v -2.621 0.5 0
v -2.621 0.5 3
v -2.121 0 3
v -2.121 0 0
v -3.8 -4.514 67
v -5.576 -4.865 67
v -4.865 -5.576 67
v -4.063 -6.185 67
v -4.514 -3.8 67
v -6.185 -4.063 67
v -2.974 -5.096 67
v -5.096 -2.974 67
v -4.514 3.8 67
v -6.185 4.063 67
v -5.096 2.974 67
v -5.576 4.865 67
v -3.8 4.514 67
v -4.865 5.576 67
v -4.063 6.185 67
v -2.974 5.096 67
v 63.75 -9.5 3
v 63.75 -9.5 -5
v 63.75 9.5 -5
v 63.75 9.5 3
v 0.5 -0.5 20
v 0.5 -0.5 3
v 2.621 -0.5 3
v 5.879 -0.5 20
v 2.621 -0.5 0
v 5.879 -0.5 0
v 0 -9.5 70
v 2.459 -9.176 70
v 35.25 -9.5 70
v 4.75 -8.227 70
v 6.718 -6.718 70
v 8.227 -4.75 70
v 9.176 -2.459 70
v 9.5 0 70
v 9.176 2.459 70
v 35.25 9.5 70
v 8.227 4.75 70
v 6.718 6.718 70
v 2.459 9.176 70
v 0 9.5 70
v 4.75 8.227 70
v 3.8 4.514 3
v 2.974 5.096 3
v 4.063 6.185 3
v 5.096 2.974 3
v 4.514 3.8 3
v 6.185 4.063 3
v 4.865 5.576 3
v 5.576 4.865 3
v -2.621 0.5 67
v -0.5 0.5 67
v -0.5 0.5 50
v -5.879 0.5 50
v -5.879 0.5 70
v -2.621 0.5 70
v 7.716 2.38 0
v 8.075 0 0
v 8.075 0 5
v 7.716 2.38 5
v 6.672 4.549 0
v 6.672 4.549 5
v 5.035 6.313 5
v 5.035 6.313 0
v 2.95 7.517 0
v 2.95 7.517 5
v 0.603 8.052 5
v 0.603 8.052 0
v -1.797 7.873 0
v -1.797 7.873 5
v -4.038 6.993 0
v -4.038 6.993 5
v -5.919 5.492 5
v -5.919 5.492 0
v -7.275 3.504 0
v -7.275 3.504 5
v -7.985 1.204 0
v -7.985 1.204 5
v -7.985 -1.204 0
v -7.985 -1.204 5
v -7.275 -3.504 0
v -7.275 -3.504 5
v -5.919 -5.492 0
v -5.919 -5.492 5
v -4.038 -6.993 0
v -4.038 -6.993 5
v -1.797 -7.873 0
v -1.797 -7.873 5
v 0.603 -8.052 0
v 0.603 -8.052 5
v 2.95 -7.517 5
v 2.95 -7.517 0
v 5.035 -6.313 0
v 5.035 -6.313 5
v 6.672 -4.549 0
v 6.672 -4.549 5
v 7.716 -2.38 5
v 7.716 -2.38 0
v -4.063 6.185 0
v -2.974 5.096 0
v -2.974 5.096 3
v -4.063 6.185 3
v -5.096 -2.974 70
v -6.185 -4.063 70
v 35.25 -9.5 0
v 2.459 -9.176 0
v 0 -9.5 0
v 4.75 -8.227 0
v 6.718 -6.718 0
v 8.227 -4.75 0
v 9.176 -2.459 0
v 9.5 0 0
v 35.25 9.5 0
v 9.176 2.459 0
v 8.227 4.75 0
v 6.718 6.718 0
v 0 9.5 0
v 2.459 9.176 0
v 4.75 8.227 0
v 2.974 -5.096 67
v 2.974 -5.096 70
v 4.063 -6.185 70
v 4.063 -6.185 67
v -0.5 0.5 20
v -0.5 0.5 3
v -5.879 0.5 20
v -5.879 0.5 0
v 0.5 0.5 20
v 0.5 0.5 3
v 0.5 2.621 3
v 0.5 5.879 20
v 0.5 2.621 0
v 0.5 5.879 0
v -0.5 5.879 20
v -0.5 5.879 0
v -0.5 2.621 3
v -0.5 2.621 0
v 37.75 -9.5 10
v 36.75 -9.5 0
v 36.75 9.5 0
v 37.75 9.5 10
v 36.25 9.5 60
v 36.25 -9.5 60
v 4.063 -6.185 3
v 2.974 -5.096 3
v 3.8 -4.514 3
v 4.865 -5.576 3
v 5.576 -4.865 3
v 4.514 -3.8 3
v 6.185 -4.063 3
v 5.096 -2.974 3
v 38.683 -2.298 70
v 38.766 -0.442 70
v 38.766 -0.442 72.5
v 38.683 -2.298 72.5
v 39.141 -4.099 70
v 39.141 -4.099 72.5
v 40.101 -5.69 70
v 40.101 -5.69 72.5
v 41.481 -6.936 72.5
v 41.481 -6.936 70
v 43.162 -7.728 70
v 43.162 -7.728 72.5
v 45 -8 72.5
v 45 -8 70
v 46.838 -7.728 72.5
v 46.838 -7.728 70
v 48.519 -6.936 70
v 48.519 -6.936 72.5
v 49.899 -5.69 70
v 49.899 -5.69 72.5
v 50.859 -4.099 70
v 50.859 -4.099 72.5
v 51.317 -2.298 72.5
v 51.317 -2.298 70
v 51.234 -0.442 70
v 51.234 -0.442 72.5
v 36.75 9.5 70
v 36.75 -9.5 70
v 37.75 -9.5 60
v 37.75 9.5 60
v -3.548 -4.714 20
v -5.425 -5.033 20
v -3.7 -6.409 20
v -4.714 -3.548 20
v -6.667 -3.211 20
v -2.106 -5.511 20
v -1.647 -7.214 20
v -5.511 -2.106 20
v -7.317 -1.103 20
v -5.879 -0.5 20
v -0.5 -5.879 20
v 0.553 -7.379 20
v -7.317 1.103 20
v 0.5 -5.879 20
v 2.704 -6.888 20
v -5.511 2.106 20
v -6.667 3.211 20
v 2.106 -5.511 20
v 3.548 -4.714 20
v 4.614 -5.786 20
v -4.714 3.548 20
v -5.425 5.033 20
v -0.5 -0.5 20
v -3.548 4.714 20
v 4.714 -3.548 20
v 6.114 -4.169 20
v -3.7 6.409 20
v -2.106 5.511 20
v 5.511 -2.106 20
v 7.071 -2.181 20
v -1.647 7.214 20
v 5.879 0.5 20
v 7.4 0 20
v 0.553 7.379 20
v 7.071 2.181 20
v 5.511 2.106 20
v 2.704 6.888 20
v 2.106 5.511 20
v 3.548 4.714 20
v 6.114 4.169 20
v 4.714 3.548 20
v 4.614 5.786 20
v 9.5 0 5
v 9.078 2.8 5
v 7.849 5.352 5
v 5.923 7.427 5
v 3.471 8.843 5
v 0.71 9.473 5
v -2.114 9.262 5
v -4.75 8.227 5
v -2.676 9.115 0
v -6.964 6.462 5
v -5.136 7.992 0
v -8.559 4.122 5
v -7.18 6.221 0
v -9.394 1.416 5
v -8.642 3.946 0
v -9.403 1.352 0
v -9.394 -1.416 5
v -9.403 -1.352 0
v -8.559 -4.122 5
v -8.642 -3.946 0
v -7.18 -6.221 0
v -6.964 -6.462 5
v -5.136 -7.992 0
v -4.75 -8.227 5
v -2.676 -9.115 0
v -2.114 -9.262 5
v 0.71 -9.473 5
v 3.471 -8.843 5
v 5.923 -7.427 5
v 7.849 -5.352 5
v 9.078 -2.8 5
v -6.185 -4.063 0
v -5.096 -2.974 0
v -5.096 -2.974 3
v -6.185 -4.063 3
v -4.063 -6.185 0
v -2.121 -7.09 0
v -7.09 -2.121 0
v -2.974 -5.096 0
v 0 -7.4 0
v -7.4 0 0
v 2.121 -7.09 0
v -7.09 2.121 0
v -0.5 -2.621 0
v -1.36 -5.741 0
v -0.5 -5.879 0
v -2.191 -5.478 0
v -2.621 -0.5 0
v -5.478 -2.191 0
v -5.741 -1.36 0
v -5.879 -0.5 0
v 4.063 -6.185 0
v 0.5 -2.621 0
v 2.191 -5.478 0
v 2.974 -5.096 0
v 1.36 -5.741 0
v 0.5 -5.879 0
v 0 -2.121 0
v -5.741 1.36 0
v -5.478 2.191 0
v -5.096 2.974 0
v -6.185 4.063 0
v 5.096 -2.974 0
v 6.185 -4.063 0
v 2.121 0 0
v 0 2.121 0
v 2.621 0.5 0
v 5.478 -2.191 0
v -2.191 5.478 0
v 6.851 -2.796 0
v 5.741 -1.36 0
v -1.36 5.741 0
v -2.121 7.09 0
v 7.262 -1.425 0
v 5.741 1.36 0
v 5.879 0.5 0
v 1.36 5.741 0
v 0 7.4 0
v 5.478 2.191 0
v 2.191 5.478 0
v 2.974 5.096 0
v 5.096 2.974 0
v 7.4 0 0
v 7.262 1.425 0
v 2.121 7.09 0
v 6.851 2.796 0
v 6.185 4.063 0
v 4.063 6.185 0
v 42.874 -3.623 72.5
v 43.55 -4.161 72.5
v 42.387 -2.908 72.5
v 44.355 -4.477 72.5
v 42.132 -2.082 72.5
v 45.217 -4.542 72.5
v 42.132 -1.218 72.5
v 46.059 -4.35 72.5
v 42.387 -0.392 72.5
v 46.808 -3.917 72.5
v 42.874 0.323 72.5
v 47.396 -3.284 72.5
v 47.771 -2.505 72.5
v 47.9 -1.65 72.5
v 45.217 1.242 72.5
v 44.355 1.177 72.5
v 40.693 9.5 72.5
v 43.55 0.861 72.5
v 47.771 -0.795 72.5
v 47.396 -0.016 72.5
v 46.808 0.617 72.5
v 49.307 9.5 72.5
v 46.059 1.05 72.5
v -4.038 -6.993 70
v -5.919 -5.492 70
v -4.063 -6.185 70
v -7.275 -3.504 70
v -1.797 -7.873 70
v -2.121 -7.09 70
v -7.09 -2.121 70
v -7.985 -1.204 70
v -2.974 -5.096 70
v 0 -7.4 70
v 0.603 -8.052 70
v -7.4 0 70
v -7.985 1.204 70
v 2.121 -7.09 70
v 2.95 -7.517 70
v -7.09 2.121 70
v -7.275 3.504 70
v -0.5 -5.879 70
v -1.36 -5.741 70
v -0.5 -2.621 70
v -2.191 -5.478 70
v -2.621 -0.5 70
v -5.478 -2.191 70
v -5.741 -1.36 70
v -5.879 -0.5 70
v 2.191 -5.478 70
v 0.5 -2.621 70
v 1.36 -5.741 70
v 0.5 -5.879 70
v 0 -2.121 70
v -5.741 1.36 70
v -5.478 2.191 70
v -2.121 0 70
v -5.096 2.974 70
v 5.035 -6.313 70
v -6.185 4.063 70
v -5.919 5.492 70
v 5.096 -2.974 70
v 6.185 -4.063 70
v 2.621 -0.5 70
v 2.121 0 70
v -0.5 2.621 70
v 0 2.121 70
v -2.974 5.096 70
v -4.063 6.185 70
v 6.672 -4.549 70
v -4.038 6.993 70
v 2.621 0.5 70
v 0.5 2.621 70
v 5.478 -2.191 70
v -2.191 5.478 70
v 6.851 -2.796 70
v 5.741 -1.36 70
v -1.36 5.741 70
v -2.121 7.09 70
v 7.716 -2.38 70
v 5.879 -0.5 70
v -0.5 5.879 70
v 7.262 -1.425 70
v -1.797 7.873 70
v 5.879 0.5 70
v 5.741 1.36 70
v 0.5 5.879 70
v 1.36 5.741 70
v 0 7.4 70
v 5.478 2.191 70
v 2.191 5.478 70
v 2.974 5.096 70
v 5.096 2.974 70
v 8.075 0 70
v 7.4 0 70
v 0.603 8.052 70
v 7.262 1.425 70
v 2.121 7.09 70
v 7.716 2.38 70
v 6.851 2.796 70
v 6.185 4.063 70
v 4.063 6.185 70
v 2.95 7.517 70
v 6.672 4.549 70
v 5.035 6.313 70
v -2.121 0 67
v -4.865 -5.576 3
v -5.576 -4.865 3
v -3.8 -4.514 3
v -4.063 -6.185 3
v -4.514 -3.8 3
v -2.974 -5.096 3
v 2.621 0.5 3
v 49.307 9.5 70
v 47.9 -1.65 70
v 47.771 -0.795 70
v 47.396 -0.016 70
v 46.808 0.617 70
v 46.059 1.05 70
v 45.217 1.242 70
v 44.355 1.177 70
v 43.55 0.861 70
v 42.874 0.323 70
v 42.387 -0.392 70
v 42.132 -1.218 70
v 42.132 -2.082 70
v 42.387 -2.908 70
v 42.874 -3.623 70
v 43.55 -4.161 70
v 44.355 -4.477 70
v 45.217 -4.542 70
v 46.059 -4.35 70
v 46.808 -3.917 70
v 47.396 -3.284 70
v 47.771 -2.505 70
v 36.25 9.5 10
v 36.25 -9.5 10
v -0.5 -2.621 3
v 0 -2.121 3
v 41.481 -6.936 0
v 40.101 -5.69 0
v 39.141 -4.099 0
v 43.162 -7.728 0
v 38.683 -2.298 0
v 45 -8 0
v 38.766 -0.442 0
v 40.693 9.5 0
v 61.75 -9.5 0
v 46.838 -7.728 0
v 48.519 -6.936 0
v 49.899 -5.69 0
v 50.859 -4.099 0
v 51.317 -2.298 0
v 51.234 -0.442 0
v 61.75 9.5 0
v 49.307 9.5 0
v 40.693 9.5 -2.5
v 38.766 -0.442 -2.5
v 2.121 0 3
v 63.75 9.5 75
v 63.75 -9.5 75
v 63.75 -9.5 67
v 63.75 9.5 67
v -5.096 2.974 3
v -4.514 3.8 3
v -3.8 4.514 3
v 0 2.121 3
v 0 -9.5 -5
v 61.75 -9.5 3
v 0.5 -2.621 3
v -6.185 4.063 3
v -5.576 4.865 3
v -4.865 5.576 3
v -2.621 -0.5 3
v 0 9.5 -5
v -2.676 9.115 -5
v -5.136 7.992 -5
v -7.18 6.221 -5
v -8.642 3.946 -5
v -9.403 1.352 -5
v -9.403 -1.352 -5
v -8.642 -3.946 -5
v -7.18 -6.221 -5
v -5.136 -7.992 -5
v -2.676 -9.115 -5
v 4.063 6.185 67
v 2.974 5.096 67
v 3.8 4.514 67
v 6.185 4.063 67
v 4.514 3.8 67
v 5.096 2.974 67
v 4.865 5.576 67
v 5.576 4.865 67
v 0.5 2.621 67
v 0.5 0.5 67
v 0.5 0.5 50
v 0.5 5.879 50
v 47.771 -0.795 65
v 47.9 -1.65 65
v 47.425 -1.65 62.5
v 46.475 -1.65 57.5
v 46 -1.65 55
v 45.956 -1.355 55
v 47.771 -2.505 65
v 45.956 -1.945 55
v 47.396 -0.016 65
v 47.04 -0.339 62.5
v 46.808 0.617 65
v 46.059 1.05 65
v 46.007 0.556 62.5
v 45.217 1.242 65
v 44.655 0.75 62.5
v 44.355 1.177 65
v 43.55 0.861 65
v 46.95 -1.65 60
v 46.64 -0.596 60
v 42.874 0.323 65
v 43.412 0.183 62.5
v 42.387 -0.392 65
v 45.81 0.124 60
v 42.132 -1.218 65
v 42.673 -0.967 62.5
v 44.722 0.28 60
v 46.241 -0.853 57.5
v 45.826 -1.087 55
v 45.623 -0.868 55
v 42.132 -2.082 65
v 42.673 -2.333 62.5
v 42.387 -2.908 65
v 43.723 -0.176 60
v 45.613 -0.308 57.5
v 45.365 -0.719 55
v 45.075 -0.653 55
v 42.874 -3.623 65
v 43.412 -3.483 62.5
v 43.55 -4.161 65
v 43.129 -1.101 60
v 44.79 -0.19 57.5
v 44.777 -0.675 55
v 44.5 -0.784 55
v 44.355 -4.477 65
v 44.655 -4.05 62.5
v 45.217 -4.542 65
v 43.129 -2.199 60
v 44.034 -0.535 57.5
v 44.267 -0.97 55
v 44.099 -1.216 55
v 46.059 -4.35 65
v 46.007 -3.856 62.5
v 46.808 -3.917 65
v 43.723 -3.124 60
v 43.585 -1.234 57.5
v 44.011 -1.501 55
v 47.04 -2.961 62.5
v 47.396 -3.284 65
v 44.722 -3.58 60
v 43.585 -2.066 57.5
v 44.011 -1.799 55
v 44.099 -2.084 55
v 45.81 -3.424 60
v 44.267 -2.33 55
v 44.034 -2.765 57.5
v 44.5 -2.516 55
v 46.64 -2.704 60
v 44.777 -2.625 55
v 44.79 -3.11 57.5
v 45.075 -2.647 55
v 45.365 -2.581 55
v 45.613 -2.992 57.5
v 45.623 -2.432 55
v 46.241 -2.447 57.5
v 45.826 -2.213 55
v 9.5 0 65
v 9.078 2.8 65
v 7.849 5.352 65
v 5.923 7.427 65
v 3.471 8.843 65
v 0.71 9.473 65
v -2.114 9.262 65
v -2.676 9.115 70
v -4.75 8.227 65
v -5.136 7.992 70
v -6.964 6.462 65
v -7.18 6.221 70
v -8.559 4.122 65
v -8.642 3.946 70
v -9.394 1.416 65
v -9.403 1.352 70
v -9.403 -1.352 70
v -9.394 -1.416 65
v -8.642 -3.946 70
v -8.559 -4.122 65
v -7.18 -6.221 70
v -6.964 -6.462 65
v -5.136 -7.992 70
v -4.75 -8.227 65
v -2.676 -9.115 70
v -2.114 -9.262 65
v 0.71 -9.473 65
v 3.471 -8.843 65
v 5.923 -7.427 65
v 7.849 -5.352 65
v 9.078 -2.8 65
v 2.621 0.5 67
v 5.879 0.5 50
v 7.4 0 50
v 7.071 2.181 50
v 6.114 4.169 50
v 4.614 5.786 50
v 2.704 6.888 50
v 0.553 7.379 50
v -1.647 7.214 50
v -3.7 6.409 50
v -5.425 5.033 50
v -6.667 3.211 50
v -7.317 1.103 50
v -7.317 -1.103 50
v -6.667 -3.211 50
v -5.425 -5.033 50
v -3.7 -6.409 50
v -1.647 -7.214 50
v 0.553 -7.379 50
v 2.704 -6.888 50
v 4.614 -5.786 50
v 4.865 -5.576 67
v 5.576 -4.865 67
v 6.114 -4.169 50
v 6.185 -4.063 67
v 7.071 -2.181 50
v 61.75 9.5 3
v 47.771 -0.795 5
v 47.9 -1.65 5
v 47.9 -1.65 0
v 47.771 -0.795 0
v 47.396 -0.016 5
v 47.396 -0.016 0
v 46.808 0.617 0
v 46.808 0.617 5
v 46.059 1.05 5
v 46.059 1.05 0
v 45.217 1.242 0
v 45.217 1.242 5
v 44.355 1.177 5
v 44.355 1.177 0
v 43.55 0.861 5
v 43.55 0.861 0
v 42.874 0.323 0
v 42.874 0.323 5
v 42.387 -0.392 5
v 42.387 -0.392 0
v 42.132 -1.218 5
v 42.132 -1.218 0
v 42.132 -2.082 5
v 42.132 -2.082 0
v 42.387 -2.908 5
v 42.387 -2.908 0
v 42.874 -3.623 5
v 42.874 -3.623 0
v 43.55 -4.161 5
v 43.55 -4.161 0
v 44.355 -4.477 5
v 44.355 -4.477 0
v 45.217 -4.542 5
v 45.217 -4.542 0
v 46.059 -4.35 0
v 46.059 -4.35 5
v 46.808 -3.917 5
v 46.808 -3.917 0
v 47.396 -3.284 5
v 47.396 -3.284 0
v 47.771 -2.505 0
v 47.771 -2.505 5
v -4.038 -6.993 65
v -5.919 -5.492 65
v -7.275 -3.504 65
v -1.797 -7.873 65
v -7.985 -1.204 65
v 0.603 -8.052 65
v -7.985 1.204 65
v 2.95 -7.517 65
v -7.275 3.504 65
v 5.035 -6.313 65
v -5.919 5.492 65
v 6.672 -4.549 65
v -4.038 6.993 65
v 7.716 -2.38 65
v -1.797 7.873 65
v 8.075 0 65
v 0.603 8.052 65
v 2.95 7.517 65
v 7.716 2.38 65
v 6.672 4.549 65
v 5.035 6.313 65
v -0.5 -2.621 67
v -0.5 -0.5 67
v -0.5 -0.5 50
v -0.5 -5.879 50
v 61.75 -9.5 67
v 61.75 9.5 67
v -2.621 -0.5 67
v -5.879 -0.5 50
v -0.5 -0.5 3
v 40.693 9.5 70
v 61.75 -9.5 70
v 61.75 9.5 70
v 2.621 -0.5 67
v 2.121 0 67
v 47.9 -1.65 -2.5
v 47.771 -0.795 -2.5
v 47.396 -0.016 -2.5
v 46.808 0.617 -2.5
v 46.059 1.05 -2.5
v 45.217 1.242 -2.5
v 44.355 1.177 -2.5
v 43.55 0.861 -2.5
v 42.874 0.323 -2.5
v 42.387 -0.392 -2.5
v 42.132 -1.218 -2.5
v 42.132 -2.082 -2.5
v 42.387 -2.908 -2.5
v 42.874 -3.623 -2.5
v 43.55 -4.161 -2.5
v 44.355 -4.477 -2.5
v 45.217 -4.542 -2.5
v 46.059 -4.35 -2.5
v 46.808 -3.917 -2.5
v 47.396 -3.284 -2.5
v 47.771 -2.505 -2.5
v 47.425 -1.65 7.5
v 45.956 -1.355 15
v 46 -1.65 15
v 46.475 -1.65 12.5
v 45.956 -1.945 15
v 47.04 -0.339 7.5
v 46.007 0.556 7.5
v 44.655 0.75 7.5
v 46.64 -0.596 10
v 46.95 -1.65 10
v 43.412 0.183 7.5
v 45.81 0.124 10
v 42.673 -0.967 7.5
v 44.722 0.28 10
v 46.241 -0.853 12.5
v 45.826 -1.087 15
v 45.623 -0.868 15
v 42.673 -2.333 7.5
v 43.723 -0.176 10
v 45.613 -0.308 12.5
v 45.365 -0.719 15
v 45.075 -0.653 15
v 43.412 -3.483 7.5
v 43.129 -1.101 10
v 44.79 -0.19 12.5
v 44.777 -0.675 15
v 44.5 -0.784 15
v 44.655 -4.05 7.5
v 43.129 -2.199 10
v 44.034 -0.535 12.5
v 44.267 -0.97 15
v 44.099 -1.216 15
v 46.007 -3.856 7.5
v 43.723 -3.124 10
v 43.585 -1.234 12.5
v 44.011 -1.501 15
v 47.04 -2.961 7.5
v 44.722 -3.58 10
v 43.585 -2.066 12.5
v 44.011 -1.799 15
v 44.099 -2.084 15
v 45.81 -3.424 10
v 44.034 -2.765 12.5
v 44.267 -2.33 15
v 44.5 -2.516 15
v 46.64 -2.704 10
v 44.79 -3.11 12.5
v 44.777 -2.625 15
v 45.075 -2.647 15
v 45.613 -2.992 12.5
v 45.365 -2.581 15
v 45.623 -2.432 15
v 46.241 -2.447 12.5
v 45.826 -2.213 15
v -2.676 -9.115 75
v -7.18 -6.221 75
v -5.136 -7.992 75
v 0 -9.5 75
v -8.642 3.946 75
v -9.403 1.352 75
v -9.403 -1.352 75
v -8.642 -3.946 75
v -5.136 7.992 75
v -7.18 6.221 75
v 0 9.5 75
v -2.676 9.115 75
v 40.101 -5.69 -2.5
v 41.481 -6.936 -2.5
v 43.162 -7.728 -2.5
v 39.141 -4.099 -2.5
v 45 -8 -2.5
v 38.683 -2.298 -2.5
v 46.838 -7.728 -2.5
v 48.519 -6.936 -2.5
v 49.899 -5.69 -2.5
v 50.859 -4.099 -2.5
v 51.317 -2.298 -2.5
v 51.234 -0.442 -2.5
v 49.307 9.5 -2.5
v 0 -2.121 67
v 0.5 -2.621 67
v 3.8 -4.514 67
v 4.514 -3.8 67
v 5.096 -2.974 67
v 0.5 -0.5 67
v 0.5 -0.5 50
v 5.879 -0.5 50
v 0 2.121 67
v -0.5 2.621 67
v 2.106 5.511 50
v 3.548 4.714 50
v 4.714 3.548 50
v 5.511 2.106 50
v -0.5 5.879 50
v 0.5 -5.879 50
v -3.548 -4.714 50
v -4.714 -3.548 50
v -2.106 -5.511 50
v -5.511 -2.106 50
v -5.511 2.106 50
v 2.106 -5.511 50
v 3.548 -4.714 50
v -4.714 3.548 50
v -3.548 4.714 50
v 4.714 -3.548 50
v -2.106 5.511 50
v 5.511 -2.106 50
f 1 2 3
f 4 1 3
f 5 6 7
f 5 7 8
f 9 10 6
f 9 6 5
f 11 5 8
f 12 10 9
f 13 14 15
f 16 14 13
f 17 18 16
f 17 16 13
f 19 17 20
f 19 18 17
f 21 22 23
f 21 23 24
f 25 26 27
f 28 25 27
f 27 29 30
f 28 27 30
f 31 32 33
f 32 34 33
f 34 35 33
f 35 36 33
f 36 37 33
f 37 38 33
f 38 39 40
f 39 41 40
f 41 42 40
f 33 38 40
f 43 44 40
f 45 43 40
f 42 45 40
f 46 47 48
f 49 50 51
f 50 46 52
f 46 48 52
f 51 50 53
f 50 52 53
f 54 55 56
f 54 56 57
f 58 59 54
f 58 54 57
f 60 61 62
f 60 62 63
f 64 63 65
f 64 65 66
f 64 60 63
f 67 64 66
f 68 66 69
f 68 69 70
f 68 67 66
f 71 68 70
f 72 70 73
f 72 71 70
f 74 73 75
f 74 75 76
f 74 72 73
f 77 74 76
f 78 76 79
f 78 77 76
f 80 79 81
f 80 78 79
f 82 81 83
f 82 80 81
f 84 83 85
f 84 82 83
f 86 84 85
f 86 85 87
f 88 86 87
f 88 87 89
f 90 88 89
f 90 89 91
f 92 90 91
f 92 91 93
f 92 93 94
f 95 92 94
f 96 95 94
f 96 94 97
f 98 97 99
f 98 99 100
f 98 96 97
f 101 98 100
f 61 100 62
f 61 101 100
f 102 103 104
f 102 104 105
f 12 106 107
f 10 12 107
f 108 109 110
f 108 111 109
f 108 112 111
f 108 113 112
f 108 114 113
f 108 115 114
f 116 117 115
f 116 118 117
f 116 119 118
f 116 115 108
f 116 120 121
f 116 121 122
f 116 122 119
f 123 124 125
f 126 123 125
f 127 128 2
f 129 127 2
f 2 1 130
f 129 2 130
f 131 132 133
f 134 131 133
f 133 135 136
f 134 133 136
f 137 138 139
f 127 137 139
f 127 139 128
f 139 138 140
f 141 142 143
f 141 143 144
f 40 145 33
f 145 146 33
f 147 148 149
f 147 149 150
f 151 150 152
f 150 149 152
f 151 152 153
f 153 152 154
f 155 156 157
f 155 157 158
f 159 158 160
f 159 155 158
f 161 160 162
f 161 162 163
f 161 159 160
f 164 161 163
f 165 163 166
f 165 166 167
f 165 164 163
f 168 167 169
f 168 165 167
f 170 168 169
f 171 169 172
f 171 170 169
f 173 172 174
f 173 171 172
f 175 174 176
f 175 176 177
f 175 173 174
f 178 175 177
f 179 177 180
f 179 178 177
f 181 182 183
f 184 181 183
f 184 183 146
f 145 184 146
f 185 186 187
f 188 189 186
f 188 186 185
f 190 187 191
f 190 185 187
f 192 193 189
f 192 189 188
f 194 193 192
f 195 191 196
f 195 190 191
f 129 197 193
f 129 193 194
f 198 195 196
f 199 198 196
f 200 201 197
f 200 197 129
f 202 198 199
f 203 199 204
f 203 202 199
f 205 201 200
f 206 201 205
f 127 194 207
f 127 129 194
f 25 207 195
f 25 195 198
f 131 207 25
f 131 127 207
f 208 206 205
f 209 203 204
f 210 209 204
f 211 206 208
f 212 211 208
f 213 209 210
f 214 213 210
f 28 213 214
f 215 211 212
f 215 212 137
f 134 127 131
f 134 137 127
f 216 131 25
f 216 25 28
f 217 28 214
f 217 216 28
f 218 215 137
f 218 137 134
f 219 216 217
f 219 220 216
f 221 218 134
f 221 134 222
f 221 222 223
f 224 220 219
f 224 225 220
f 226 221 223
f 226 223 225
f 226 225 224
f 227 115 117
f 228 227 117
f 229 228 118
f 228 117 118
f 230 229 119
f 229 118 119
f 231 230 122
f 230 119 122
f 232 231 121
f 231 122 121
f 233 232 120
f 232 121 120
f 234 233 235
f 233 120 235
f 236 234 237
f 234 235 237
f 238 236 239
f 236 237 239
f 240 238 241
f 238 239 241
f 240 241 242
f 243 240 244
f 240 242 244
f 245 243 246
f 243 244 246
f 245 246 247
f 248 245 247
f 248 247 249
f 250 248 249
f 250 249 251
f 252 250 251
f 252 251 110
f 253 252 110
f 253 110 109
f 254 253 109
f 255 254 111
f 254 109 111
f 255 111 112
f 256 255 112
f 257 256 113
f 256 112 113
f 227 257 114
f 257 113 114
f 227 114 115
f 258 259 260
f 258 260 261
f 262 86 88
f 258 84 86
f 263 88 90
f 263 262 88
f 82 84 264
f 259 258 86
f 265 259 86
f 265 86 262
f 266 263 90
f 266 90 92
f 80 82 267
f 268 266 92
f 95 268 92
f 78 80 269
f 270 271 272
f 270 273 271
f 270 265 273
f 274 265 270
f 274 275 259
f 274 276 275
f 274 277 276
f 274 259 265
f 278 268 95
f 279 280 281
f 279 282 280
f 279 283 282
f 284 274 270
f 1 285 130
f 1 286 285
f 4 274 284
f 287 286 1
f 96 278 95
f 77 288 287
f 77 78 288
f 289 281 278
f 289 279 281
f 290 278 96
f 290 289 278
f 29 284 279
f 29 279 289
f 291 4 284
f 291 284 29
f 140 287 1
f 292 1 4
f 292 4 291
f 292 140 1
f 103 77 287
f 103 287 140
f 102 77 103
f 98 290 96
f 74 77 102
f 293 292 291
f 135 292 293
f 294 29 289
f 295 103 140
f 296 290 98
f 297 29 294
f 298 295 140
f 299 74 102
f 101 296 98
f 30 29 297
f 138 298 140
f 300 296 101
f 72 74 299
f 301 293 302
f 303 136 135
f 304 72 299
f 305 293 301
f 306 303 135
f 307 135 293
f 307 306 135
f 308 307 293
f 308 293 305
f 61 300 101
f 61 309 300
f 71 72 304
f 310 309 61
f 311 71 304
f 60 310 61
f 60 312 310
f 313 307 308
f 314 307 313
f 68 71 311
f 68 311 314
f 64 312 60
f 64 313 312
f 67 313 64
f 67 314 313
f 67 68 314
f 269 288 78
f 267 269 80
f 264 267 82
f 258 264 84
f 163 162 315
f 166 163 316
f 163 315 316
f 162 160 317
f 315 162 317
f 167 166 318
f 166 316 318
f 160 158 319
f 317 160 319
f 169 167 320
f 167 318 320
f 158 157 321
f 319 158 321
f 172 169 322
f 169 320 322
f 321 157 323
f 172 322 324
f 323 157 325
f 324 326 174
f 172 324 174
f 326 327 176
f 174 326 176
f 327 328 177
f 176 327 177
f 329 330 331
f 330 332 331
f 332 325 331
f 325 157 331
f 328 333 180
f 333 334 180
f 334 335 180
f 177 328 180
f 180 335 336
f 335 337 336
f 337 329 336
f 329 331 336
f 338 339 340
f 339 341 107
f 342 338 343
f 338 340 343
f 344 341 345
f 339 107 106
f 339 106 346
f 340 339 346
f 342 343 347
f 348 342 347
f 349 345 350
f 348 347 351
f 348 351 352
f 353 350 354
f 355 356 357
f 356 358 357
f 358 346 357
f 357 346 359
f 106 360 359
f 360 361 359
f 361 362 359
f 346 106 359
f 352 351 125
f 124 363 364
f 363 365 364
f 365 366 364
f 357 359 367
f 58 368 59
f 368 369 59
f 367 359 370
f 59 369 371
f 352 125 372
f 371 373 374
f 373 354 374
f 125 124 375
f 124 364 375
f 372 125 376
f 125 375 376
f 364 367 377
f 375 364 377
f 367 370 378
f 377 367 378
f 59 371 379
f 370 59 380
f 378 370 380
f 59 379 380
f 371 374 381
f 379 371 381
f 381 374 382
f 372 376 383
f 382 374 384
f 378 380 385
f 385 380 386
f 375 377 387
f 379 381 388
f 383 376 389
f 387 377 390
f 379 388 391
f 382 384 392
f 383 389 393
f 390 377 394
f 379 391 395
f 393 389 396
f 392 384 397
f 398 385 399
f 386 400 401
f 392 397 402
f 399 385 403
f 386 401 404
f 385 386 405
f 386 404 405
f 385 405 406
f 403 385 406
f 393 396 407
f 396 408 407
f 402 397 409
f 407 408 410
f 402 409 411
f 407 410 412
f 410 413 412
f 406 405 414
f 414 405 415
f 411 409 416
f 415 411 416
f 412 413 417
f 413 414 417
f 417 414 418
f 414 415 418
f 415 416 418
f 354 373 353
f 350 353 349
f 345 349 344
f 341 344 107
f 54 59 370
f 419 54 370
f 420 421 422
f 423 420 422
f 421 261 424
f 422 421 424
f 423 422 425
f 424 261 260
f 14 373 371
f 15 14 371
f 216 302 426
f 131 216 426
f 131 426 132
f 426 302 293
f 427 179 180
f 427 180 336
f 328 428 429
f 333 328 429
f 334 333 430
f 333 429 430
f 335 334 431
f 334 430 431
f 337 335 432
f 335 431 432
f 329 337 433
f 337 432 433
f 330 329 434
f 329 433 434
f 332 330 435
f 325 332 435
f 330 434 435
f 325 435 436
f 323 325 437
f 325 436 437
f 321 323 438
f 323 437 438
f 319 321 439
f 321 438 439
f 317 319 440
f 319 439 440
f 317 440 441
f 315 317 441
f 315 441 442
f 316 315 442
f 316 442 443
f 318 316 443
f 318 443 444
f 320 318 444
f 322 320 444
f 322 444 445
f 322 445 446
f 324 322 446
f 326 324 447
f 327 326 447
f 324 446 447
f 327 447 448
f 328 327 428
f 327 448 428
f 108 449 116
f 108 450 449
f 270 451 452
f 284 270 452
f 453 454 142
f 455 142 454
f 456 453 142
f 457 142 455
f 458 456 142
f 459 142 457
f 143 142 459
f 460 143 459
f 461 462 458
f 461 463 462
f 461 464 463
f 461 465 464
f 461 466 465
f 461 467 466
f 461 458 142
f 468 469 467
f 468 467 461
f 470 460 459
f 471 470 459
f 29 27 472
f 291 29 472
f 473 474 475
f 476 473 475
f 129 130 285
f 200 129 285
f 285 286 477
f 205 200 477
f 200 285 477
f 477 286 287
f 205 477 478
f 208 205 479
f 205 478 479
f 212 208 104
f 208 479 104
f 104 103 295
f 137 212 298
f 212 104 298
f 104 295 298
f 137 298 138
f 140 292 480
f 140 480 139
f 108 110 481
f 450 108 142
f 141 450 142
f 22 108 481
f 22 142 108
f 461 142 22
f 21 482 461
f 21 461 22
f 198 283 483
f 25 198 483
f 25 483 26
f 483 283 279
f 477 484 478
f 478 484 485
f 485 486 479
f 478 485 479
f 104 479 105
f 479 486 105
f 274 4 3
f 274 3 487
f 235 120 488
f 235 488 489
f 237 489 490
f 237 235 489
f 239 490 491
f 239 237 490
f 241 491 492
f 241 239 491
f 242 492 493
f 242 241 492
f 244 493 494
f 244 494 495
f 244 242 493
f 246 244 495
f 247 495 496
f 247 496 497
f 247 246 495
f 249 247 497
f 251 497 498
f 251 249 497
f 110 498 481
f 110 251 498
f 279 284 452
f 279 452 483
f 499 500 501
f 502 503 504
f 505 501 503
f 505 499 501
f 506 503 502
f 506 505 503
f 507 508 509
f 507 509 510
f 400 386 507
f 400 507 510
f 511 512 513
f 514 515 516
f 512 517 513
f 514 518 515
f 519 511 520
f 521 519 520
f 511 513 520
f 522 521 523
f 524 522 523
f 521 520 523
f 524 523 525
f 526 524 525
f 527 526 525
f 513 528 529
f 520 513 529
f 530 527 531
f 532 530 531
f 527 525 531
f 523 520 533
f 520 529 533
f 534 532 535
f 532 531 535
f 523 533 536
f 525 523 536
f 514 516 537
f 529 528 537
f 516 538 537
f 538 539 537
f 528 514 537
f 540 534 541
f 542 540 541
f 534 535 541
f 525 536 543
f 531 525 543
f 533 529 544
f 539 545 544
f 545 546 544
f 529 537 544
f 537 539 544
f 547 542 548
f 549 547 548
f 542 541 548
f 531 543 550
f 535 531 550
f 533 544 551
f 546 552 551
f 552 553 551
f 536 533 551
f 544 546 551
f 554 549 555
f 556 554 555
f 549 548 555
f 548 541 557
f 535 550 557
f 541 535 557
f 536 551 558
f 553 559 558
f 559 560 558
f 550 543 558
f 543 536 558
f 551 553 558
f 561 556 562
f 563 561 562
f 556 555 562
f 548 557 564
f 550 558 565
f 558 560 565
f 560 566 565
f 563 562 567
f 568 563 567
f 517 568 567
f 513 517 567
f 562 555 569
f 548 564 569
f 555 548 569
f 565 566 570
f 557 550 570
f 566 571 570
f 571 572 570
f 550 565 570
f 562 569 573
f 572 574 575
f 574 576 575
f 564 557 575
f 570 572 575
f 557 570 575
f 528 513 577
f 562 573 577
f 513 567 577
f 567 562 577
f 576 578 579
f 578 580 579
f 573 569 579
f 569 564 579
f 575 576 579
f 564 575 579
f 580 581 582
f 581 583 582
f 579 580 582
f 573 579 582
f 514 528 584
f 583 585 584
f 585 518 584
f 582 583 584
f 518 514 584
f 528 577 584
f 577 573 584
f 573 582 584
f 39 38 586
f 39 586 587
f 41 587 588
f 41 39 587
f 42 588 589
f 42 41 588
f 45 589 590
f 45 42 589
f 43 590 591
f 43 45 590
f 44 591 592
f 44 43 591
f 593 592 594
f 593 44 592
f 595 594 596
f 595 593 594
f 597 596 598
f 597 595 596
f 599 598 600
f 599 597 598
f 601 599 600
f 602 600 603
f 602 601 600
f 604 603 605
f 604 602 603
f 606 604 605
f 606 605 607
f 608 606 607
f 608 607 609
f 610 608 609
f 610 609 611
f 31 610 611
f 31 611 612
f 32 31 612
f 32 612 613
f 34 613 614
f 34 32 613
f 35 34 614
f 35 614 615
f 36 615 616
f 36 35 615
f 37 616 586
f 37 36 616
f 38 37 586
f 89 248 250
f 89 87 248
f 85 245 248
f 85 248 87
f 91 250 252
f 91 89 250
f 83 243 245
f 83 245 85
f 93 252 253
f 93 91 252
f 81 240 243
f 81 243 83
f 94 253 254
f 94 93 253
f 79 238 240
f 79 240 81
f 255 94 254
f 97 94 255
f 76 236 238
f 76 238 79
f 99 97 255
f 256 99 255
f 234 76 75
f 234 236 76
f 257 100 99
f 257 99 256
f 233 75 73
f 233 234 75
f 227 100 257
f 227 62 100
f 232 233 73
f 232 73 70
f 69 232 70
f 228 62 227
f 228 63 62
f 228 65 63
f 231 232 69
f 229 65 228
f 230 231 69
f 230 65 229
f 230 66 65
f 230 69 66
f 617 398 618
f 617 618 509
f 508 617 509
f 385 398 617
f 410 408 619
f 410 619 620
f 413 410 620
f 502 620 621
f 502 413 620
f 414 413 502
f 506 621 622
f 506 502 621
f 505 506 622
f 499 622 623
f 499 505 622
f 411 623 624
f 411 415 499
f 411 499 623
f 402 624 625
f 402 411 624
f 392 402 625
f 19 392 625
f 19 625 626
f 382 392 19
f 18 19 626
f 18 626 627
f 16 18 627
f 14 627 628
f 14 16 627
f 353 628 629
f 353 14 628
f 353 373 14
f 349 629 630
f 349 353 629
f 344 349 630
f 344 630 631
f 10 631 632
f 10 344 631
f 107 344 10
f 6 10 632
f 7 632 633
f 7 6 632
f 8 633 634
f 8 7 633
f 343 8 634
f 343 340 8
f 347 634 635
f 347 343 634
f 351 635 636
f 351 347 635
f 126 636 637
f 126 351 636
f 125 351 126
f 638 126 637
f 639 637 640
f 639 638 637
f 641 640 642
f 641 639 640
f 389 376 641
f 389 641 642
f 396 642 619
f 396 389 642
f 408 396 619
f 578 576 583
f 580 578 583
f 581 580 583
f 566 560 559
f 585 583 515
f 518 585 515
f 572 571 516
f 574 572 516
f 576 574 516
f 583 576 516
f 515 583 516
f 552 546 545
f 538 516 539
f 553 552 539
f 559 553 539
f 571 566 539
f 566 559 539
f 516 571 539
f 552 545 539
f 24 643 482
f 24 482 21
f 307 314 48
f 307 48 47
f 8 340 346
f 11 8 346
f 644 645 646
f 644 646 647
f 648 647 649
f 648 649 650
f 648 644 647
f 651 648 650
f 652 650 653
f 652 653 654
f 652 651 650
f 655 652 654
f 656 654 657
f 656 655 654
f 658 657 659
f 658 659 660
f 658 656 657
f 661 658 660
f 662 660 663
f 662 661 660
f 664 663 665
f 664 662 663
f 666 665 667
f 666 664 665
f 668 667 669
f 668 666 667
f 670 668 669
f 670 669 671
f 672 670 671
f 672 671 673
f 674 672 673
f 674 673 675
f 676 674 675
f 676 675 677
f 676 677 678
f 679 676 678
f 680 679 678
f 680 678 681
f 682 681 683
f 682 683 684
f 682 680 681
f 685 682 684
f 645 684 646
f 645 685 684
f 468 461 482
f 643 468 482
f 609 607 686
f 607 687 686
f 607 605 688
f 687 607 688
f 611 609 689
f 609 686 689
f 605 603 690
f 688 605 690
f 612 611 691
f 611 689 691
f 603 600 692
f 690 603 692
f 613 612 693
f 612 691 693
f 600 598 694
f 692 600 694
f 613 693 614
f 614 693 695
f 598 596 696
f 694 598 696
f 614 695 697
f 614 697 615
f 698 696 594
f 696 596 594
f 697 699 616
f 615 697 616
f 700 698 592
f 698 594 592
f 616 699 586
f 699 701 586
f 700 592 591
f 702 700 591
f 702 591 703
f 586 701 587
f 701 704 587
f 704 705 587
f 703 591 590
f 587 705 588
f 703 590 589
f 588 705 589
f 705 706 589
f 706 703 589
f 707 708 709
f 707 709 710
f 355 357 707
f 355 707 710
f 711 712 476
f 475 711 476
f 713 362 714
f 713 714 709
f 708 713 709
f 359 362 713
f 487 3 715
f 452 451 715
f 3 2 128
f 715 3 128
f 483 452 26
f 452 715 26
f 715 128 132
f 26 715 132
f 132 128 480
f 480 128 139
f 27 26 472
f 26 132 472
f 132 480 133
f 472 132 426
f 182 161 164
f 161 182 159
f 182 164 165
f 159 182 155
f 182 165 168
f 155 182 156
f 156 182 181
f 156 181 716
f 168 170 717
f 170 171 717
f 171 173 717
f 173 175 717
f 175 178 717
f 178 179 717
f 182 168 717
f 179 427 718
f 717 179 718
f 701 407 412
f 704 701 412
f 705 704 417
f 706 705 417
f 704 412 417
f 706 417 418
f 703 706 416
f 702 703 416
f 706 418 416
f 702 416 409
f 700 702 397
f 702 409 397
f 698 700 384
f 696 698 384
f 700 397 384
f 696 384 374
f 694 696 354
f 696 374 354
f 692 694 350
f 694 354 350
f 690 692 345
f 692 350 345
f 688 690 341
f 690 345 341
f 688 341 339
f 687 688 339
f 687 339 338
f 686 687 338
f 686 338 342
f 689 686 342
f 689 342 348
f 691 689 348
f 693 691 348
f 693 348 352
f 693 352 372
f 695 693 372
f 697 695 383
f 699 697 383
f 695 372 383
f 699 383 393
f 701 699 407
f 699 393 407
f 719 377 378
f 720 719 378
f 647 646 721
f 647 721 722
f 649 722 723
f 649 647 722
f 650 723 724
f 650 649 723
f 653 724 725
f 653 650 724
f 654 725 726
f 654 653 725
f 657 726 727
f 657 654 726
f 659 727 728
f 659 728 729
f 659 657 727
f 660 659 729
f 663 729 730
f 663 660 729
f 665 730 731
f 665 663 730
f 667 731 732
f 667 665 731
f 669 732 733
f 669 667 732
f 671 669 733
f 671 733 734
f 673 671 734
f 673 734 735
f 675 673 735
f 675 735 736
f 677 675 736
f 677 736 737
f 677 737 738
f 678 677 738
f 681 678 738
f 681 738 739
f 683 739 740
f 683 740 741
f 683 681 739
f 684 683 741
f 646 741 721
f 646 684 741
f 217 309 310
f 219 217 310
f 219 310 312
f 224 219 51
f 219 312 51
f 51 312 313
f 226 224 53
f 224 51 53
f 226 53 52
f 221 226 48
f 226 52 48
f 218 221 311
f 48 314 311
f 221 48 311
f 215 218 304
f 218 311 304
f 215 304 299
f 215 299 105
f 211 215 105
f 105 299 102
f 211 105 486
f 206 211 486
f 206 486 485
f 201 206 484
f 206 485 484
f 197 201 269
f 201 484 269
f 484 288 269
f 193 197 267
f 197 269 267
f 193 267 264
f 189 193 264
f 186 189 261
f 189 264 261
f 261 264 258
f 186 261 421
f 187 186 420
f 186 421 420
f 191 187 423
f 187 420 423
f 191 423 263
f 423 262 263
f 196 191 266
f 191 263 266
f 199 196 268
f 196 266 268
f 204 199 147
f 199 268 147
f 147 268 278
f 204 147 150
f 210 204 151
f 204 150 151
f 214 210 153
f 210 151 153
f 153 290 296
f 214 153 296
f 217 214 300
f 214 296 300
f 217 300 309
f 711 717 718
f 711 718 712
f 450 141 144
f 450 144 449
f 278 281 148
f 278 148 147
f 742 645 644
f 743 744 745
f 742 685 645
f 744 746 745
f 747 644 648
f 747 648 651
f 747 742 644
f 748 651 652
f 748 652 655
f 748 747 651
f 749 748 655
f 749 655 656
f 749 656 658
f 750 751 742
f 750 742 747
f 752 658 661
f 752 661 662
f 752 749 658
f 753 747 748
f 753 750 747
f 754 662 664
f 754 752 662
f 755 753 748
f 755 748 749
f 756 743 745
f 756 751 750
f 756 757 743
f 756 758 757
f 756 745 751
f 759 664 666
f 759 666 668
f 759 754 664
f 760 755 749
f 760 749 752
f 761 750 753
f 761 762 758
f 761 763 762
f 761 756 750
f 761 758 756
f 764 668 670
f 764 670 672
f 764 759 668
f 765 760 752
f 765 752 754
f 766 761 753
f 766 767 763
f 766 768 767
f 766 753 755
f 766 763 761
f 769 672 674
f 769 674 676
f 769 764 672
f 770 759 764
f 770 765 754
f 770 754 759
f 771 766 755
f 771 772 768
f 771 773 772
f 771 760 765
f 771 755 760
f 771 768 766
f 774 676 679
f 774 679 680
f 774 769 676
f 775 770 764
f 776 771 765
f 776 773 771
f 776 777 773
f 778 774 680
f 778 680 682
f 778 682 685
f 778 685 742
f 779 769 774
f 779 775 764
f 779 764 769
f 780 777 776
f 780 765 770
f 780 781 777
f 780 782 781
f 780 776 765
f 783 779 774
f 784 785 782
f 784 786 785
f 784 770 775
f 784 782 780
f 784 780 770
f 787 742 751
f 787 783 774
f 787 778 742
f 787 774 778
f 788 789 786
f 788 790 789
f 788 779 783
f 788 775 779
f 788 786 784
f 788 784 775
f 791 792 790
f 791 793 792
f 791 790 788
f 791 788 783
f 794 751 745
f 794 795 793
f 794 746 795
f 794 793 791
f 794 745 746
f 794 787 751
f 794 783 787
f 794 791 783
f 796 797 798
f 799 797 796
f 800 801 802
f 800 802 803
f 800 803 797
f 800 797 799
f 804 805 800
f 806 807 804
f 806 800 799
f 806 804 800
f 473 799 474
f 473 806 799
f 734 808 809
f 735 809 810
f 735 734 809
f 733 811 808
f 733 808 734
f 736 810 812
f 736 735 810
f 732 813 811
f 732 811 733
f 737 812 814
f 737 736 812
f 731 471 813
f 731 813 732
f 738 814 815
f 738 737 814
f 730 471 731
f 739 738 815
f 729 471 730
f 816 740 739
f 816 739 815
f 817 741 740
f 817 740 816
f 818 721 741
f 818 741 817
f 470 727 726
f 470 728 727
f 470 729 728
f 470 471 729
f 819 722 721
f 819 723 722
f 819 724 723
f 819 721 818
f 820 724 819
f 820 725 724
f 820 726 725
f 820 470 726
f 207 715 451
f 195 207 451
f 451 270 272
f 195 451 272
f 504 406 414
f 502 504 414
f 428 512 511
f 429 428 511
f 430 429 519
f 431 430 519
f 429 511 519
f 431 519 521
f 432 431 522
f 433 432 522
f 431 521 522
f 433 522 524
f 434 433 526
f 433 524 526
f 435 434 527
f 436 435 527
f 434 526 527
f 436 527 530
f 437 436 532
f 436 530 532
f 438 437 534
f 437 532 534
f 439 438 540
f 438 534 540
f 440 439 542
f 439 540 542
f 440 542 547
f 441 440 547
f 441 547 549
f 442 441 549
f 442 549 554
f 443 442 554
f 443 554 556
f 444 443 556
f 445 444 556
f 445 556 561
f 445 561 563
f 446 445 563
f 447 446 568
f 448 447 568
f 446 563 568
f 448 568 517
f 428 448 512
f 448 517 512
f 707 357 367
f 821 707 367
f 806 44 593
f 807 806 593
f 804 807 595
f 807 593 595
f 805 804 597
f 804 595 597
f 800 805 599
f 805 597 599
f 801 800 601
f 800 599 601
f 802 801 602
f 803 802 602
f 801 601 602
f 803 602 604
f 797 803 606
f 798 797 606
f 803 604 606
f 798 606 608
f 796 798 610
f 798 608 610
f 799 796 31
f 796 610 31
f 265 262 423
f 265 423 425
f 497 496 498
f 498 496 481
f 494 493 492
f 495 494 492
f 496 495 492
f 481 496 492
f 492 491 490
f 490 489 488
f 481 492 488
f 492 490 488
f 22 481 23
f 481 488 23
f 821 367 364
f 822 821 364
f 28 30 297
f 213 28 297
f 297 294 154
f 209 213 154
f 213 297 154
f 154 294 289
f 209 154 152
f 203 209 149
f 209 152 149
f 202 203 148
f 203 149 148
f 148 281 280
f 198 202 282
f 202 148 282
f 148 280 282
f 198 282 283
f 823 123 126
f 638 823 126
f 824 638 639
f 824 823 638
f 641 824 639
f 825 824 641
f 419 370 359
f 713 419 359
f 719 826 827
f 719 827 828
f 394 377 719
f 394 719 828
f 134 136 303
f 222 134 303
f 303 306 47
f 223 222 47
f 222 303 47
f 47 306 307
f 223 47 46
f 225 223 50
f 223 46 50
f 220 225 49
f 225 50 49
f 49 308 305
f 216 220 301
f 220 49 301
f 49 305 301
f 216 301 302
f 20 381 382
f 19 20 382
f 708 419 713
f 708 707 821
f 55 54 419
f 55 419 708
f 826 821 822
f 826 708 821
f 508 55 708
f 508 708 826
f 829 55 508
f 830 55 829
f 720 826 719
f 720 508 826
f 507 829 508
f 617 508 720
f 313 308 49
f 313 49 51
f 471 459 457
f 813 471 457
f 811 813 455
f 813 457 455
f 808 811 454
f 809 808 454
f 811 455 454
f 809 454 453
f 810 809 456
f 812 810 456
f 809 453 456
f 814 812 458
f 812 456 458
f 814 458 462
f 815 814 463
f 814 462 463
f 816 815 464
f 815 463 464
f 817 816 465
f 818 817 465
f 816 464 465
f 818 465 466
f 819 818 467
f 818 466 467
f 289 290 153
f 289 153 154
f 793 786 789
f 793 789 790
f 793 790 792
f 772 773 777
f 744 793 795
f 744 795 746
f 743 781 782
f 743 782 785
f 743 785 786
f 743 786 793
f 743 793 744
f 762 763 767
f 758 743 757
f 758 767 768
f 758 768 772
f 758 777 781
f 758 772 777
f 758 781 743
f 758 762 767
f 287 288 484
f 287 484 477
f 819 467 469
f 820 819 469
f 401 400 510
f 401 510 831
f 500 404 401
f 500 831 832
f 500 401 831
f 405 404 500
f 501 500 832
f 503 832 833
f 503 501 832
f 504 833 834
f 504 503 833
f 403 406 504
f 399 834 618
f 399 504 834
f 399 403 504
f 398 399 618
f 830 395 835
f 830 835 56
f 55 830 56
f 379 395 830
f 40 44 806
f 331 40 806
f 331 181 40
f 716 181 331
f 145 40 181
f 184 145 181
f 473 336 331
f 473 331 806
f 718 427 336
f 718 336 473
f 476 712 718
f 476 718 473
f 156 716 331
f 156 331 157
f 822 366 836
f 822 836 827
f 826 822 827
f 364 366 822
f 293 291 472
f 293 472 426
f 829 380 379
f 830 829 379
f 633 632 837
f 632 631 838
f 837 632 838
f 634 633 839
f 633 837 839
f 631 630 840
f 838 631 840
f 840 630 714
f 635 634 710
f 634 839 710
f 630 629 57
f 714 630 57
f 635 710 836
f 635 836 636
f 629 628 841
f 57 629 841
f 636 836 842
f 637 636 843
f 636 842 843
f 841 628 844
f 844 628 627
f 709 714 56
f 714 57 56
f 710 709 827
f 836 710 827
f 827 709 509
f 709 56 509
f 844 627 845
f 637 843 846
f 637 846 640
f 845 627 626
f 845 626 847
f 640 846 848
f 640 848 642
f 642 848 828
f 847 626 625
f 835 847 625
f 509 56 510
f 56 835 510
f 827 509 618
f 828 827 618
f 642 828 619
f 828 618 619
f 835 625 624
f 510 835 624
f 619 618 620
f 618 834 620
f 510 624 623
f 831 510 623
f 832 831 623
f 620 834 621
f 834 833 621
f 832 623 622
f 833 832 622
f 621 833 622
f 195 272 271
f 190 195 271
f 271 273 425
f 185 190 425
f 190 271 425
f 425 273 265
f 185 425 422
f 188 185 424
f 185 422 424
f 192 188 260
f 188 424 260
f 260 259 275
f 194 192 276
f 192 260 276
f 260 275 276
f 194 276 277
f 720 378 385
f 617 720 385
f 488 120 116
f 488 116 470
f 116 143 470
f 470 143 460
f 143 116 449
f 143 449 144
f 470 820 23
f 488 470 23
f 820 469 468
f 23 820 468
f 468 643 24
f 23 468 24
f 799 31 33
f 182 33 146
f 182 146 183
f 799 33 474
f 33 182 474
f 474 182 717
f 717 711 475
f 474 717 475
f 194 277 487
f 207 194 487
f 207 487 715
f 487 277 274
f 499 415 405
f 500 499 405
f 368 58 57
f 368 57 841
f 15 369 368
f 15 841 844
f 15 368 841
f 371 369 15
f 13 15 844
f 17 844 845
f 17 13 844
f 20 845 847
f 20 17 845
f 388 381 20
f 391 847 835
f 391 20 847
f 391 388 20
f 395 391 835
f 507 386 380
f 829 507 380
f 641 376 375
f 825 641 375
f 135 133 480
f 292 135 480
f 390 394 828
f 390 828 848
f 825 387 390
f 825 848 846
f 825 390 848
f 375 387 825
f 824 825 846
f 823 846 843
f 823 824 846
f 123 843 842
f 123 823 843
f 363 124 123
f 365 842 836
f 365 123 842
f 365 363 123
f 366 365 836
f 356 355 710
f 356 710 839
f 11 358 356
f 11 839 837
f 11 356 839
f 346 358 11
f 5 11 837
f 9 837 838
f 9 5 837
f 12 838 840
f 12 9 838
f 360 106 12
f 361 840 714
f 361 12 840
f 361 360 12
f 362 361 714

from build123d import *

# Parameters (mm, degrees)
F1_R      = 7.4
F2_DEPTH  = 20
F3_R      = 9.5
F3_R_2    = 8.075
F4_DEPTH  = 5
F6_DEPTH  = 3
F10_DEPTH = 5
F11_W     = 2
F11_H     = 3
F12_DEPTH = 9.5
F13_R     = 2.9
F14_DEPTH = 2.5


with BuildPart() as f2:
    # F1 (on Top) → F2 (new body)
    with BuildSketch(Plane.XY):
        Circle(F1_R)
        with BuildLine():
            ThreePointArc((-0.5, -5.8787753827), (-4.171930009, -4.171930009), (-5.8787753827, -0.5))
            Line((-5.8787753827, -0.5), (-0.5, -0.5))
            Line((-0.5, -0.5), (-0.5, -5.8787753827))
        make_face(mode=Mode.SUBTRACT)
        with BuildLine():
            ThreePointArc((5.8787753827, -0.5), (4.171930009, -4.171930009), (0.5, -5.8787753827))
            Line((0.5, -5.8787753827), (0.5, -0.5))
            Line((0.5, -0.5), (5.8787753827, -0.5))
        make_face(mode=Mode.SUBTRACT)
        with BuildLine():
            ThreePointArc((-5.8787753827, 0.5), (-4.171930009, 4.171930009), (-0.5, 5.8787753827))
            Line((-0.5, 5.8787753827), (-0.5, 0.5))
            Line((-0.5, 0.5), (-5.8787753827, 0.5))
        make_face(mode=Mode.SUBTRACT)
        with BuildLine():
            Line((0.5, 0.5), (0.5, 5.8787753827))
            ThreePointArc((0.5, 5.8787753827), (4.171930009, 4.171930009), (5.8787753827, 0.5))
            Line((5.8787753827, 0.5), (0.5, 0.5))
        make_face(mode=Mode.SUBTRACT)
    extrude(amount=F2_DEPTH)

    # F5 (on Top) → F6 (cut)
    with BuildSketch(Plane.XY):
        with BuildLine():
            Line((0, 2.1213203436), (-4.063303138, 6.1846234816))
            ThreePointArc((-4.063303138, 6.1846234816), (-5.2325901808, 5.2325901808), (-6.1846234816, 4.063303138))
            Line((-6.1846234816, 4.063303138), (-2.1213203436, 0))
            Line((-2.1213203436, 0), (-6.1846234816, -4.063303138))
            ThreePointArc((-6.1846234816, -4.063303138), (-5.2325901808, -5.2325901808), (-4.063303138, -6.1846234816))
            Line((-4.063303138, -6.1846234816), (0, -2.1213203436))
            Line((0, -2.1213203436), (4.063303138, -6.1846234816))
            ThreePointArc((4.063303138, -6.1846234816), (5.2325901808, -5.2325901808), (6.1846234816, -4.063303138))
            Line((6.1846234816, -4.063303138), (2.1213203436, 0))
            Line((2.1213203436, 0), (6.1846234816, 4.063303138))
            ThreePointArc((6.1846234816, 4.063303138), (5.2325901808, 5.2325901808), (4.063303138, 6.1846234816))
            Line((4.063303138, 6.1846234816), (0, 2.1213203436))
        make_face()
    extrude(amount=F6_DEPTH, mode=Mode.SUBTRACT)



with BuildPart() as f4:
    # F3 (on Top) → F4 (new body)
    with BuildSketch(Plane.XY):
        Circle(F3_R)
        Circle(F3_R_2, mode=Mode.SUBTRACT)
    extrude(amount=F4_DEPTH)


with BuildPart() as f8:
    # F7 (on offset) → F8 (revolve)
    with BuildSketch(Plane.XZ.offset(1.65)):
        Polygon((46, 15), (45, 15), (45, 0), (47.9, 0), (47.9, 5), align=None)
    revolve(axis=Axis((45, -1.65, 7.5), (0, 0, 1)))


with BuildPart() as f2_1:
    add(f2.part)

    add(f4.part)  # F10 merges F4

    add(f8.part)  # F10 merges F8
    # F9 (on Top) → F10 (join)
    with BuildSketch(Plane.XY):
        with BuildLine():
            Line((63.75, 9.5), (0, 9.5))
            ThreePointArc((0, 9.5), (-9.5, 0), (0, -9.5))
            Line((0, -9.5), (63.75, -9.5))
            Line((63.75, -9.5), (63.75, 9.5))
        make_face()
    extrude(amount=-F10_DEPTH)

    # F11 (on Front) → F12 (join, symmetric)
    with BuildSketch(Plane.XZ):
        with Locations((62.75, 1.5)):
            Rectangle(F11_W, F11_H)
        Polygon((35.25, 0), (36.75, 0), (37.75, 10), (36.25, 10), align=None)
    extrude(amount=F12_DEPTH, both=True)

    # F13 (on Top) → F14 (cut)
    with BuildSketch(Plane.XY):
        with BuildLine():
            Line((51.2339806081, -0.4417003717), (48.9269169818, 11.4611336364))
            ThreePointArc((48.9269169818, 11.4611336364), (45, 14.7000001743), (41.0730830182, 11.4611336364))
            Line((41.0730830182, 11.4611336364), (38.7660193919, -0.4417003717))
            ThreePointArc((38.7660193919, -0.4417003717), (45, -8.0000001743), (51.2339806081, -0.4417003717))
        make_face()
        with Locations((45, -1.65)):
            Circle(F13_R, mode=Mode.SUBTRACT)
    extrude(amount=-F14_DEPTH, mode=Mode.SUBTRACT)


with BuildPart() as f16_1:
    # F16: instance of F2
    add(f2_1.part.mirror(Plane.XY.offset(35)))


solid = Compound([f2_1.part, f16_1.part])
